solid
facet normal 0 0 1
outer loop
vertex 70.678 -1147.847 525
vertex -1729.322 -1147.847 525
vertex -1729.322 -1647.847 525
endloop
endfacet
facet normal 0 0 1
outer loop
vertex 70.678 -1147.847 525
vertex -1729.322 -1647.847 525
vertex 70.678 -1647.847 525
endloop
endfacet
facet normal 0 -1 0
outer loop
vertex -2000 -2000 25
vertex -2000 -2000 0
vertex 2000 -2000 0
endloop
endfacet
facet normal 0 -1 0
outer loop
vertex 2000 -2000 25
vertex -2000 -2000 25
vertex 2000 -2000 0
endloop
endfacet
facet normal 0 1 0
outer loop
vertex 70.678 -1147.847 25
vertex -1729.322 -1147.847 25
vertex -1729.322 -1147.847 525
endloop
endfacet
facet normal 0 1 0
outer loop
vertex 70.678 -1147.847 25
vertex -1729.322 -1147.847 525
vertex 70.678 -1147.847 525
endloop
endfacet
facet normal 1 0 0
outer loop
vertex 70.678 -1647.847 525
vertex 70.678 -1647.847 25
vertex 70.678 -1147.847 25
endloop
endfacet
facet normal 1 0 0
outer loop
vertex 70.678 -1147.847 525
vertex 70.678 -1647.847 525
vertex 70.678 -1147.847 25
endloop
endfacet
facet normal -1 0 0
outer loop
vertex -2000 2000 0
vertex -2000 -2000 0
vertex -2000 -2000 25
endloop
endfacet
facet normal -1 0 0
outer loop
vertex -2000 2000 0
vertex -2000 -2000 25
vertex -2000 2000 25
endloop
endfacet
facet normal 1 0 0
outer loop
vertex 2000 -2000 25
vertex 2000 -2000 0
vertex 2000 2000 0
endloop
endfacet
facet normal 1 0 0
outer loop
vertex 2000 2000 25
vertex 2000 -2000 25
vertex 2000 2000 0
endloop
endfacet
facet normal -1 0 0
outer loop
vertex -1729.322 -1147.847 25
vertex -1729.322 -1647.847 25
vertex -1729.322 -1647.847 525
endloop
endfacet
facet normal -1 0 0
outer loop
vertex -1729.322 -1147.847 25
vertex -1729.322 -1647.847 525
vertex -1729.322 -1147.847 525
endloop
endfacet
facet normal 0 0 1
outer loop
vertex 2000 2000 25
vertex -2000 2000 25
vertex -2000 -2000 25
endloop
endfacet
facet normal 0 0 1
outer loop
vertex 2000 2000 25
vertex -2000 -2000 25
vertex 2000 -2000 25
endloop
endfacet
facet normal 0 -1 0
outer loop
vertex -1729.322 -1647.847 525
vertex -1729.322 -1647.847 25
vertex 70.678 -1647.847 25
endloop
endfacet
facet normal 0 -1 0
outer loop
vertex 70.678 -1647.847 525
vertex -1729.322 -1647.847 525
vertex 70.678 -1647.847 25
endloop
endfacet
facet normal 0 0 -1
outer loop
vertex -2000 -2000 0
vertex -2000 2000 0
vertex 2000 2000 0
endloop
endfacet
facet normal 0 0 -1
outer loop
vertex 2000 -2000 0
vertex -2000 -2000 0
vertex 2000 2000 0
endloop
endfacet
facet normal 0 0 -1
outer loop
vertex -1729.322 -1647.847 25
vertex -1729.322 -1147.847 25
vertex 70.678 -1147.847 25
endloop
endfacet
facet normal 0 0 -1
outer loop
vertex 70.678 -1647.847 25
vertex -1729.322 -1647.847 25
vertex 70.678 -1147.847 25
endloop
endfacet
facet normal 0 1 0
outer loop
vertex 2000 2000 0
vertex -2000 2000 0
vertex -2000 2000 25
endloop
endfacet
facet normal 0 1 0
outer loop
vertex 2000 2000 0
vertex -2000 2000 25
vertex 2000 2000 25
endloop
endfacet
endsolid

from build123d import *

# Parameters (mm, degrees)
F0_W     = 4000
F0_H     = 4000
F1_DEPTH = 25
F2_W     = 1800
F2_H     = 500
F3_DEPTH = 500


with BuildPart() as f1:
    # F0 (on Top) → F1 (new body)
    with BuildSketch(Plane.XY):
        Rectangle(F0_W, F0_H)
    extrude(amount=F1_DEPTH)


with BuildPart() as f3:
    # F2 (on face) → F3 (new body)
    with BuildSketch(Plane.XY.offset(25)):
        with Locations((-829.321808, -1397.846937)):
            Rectangle(F2_W, F2_H)
    extrude(amount=F3_DEPTH)


solid = Compound([f1.part, f3.part])
